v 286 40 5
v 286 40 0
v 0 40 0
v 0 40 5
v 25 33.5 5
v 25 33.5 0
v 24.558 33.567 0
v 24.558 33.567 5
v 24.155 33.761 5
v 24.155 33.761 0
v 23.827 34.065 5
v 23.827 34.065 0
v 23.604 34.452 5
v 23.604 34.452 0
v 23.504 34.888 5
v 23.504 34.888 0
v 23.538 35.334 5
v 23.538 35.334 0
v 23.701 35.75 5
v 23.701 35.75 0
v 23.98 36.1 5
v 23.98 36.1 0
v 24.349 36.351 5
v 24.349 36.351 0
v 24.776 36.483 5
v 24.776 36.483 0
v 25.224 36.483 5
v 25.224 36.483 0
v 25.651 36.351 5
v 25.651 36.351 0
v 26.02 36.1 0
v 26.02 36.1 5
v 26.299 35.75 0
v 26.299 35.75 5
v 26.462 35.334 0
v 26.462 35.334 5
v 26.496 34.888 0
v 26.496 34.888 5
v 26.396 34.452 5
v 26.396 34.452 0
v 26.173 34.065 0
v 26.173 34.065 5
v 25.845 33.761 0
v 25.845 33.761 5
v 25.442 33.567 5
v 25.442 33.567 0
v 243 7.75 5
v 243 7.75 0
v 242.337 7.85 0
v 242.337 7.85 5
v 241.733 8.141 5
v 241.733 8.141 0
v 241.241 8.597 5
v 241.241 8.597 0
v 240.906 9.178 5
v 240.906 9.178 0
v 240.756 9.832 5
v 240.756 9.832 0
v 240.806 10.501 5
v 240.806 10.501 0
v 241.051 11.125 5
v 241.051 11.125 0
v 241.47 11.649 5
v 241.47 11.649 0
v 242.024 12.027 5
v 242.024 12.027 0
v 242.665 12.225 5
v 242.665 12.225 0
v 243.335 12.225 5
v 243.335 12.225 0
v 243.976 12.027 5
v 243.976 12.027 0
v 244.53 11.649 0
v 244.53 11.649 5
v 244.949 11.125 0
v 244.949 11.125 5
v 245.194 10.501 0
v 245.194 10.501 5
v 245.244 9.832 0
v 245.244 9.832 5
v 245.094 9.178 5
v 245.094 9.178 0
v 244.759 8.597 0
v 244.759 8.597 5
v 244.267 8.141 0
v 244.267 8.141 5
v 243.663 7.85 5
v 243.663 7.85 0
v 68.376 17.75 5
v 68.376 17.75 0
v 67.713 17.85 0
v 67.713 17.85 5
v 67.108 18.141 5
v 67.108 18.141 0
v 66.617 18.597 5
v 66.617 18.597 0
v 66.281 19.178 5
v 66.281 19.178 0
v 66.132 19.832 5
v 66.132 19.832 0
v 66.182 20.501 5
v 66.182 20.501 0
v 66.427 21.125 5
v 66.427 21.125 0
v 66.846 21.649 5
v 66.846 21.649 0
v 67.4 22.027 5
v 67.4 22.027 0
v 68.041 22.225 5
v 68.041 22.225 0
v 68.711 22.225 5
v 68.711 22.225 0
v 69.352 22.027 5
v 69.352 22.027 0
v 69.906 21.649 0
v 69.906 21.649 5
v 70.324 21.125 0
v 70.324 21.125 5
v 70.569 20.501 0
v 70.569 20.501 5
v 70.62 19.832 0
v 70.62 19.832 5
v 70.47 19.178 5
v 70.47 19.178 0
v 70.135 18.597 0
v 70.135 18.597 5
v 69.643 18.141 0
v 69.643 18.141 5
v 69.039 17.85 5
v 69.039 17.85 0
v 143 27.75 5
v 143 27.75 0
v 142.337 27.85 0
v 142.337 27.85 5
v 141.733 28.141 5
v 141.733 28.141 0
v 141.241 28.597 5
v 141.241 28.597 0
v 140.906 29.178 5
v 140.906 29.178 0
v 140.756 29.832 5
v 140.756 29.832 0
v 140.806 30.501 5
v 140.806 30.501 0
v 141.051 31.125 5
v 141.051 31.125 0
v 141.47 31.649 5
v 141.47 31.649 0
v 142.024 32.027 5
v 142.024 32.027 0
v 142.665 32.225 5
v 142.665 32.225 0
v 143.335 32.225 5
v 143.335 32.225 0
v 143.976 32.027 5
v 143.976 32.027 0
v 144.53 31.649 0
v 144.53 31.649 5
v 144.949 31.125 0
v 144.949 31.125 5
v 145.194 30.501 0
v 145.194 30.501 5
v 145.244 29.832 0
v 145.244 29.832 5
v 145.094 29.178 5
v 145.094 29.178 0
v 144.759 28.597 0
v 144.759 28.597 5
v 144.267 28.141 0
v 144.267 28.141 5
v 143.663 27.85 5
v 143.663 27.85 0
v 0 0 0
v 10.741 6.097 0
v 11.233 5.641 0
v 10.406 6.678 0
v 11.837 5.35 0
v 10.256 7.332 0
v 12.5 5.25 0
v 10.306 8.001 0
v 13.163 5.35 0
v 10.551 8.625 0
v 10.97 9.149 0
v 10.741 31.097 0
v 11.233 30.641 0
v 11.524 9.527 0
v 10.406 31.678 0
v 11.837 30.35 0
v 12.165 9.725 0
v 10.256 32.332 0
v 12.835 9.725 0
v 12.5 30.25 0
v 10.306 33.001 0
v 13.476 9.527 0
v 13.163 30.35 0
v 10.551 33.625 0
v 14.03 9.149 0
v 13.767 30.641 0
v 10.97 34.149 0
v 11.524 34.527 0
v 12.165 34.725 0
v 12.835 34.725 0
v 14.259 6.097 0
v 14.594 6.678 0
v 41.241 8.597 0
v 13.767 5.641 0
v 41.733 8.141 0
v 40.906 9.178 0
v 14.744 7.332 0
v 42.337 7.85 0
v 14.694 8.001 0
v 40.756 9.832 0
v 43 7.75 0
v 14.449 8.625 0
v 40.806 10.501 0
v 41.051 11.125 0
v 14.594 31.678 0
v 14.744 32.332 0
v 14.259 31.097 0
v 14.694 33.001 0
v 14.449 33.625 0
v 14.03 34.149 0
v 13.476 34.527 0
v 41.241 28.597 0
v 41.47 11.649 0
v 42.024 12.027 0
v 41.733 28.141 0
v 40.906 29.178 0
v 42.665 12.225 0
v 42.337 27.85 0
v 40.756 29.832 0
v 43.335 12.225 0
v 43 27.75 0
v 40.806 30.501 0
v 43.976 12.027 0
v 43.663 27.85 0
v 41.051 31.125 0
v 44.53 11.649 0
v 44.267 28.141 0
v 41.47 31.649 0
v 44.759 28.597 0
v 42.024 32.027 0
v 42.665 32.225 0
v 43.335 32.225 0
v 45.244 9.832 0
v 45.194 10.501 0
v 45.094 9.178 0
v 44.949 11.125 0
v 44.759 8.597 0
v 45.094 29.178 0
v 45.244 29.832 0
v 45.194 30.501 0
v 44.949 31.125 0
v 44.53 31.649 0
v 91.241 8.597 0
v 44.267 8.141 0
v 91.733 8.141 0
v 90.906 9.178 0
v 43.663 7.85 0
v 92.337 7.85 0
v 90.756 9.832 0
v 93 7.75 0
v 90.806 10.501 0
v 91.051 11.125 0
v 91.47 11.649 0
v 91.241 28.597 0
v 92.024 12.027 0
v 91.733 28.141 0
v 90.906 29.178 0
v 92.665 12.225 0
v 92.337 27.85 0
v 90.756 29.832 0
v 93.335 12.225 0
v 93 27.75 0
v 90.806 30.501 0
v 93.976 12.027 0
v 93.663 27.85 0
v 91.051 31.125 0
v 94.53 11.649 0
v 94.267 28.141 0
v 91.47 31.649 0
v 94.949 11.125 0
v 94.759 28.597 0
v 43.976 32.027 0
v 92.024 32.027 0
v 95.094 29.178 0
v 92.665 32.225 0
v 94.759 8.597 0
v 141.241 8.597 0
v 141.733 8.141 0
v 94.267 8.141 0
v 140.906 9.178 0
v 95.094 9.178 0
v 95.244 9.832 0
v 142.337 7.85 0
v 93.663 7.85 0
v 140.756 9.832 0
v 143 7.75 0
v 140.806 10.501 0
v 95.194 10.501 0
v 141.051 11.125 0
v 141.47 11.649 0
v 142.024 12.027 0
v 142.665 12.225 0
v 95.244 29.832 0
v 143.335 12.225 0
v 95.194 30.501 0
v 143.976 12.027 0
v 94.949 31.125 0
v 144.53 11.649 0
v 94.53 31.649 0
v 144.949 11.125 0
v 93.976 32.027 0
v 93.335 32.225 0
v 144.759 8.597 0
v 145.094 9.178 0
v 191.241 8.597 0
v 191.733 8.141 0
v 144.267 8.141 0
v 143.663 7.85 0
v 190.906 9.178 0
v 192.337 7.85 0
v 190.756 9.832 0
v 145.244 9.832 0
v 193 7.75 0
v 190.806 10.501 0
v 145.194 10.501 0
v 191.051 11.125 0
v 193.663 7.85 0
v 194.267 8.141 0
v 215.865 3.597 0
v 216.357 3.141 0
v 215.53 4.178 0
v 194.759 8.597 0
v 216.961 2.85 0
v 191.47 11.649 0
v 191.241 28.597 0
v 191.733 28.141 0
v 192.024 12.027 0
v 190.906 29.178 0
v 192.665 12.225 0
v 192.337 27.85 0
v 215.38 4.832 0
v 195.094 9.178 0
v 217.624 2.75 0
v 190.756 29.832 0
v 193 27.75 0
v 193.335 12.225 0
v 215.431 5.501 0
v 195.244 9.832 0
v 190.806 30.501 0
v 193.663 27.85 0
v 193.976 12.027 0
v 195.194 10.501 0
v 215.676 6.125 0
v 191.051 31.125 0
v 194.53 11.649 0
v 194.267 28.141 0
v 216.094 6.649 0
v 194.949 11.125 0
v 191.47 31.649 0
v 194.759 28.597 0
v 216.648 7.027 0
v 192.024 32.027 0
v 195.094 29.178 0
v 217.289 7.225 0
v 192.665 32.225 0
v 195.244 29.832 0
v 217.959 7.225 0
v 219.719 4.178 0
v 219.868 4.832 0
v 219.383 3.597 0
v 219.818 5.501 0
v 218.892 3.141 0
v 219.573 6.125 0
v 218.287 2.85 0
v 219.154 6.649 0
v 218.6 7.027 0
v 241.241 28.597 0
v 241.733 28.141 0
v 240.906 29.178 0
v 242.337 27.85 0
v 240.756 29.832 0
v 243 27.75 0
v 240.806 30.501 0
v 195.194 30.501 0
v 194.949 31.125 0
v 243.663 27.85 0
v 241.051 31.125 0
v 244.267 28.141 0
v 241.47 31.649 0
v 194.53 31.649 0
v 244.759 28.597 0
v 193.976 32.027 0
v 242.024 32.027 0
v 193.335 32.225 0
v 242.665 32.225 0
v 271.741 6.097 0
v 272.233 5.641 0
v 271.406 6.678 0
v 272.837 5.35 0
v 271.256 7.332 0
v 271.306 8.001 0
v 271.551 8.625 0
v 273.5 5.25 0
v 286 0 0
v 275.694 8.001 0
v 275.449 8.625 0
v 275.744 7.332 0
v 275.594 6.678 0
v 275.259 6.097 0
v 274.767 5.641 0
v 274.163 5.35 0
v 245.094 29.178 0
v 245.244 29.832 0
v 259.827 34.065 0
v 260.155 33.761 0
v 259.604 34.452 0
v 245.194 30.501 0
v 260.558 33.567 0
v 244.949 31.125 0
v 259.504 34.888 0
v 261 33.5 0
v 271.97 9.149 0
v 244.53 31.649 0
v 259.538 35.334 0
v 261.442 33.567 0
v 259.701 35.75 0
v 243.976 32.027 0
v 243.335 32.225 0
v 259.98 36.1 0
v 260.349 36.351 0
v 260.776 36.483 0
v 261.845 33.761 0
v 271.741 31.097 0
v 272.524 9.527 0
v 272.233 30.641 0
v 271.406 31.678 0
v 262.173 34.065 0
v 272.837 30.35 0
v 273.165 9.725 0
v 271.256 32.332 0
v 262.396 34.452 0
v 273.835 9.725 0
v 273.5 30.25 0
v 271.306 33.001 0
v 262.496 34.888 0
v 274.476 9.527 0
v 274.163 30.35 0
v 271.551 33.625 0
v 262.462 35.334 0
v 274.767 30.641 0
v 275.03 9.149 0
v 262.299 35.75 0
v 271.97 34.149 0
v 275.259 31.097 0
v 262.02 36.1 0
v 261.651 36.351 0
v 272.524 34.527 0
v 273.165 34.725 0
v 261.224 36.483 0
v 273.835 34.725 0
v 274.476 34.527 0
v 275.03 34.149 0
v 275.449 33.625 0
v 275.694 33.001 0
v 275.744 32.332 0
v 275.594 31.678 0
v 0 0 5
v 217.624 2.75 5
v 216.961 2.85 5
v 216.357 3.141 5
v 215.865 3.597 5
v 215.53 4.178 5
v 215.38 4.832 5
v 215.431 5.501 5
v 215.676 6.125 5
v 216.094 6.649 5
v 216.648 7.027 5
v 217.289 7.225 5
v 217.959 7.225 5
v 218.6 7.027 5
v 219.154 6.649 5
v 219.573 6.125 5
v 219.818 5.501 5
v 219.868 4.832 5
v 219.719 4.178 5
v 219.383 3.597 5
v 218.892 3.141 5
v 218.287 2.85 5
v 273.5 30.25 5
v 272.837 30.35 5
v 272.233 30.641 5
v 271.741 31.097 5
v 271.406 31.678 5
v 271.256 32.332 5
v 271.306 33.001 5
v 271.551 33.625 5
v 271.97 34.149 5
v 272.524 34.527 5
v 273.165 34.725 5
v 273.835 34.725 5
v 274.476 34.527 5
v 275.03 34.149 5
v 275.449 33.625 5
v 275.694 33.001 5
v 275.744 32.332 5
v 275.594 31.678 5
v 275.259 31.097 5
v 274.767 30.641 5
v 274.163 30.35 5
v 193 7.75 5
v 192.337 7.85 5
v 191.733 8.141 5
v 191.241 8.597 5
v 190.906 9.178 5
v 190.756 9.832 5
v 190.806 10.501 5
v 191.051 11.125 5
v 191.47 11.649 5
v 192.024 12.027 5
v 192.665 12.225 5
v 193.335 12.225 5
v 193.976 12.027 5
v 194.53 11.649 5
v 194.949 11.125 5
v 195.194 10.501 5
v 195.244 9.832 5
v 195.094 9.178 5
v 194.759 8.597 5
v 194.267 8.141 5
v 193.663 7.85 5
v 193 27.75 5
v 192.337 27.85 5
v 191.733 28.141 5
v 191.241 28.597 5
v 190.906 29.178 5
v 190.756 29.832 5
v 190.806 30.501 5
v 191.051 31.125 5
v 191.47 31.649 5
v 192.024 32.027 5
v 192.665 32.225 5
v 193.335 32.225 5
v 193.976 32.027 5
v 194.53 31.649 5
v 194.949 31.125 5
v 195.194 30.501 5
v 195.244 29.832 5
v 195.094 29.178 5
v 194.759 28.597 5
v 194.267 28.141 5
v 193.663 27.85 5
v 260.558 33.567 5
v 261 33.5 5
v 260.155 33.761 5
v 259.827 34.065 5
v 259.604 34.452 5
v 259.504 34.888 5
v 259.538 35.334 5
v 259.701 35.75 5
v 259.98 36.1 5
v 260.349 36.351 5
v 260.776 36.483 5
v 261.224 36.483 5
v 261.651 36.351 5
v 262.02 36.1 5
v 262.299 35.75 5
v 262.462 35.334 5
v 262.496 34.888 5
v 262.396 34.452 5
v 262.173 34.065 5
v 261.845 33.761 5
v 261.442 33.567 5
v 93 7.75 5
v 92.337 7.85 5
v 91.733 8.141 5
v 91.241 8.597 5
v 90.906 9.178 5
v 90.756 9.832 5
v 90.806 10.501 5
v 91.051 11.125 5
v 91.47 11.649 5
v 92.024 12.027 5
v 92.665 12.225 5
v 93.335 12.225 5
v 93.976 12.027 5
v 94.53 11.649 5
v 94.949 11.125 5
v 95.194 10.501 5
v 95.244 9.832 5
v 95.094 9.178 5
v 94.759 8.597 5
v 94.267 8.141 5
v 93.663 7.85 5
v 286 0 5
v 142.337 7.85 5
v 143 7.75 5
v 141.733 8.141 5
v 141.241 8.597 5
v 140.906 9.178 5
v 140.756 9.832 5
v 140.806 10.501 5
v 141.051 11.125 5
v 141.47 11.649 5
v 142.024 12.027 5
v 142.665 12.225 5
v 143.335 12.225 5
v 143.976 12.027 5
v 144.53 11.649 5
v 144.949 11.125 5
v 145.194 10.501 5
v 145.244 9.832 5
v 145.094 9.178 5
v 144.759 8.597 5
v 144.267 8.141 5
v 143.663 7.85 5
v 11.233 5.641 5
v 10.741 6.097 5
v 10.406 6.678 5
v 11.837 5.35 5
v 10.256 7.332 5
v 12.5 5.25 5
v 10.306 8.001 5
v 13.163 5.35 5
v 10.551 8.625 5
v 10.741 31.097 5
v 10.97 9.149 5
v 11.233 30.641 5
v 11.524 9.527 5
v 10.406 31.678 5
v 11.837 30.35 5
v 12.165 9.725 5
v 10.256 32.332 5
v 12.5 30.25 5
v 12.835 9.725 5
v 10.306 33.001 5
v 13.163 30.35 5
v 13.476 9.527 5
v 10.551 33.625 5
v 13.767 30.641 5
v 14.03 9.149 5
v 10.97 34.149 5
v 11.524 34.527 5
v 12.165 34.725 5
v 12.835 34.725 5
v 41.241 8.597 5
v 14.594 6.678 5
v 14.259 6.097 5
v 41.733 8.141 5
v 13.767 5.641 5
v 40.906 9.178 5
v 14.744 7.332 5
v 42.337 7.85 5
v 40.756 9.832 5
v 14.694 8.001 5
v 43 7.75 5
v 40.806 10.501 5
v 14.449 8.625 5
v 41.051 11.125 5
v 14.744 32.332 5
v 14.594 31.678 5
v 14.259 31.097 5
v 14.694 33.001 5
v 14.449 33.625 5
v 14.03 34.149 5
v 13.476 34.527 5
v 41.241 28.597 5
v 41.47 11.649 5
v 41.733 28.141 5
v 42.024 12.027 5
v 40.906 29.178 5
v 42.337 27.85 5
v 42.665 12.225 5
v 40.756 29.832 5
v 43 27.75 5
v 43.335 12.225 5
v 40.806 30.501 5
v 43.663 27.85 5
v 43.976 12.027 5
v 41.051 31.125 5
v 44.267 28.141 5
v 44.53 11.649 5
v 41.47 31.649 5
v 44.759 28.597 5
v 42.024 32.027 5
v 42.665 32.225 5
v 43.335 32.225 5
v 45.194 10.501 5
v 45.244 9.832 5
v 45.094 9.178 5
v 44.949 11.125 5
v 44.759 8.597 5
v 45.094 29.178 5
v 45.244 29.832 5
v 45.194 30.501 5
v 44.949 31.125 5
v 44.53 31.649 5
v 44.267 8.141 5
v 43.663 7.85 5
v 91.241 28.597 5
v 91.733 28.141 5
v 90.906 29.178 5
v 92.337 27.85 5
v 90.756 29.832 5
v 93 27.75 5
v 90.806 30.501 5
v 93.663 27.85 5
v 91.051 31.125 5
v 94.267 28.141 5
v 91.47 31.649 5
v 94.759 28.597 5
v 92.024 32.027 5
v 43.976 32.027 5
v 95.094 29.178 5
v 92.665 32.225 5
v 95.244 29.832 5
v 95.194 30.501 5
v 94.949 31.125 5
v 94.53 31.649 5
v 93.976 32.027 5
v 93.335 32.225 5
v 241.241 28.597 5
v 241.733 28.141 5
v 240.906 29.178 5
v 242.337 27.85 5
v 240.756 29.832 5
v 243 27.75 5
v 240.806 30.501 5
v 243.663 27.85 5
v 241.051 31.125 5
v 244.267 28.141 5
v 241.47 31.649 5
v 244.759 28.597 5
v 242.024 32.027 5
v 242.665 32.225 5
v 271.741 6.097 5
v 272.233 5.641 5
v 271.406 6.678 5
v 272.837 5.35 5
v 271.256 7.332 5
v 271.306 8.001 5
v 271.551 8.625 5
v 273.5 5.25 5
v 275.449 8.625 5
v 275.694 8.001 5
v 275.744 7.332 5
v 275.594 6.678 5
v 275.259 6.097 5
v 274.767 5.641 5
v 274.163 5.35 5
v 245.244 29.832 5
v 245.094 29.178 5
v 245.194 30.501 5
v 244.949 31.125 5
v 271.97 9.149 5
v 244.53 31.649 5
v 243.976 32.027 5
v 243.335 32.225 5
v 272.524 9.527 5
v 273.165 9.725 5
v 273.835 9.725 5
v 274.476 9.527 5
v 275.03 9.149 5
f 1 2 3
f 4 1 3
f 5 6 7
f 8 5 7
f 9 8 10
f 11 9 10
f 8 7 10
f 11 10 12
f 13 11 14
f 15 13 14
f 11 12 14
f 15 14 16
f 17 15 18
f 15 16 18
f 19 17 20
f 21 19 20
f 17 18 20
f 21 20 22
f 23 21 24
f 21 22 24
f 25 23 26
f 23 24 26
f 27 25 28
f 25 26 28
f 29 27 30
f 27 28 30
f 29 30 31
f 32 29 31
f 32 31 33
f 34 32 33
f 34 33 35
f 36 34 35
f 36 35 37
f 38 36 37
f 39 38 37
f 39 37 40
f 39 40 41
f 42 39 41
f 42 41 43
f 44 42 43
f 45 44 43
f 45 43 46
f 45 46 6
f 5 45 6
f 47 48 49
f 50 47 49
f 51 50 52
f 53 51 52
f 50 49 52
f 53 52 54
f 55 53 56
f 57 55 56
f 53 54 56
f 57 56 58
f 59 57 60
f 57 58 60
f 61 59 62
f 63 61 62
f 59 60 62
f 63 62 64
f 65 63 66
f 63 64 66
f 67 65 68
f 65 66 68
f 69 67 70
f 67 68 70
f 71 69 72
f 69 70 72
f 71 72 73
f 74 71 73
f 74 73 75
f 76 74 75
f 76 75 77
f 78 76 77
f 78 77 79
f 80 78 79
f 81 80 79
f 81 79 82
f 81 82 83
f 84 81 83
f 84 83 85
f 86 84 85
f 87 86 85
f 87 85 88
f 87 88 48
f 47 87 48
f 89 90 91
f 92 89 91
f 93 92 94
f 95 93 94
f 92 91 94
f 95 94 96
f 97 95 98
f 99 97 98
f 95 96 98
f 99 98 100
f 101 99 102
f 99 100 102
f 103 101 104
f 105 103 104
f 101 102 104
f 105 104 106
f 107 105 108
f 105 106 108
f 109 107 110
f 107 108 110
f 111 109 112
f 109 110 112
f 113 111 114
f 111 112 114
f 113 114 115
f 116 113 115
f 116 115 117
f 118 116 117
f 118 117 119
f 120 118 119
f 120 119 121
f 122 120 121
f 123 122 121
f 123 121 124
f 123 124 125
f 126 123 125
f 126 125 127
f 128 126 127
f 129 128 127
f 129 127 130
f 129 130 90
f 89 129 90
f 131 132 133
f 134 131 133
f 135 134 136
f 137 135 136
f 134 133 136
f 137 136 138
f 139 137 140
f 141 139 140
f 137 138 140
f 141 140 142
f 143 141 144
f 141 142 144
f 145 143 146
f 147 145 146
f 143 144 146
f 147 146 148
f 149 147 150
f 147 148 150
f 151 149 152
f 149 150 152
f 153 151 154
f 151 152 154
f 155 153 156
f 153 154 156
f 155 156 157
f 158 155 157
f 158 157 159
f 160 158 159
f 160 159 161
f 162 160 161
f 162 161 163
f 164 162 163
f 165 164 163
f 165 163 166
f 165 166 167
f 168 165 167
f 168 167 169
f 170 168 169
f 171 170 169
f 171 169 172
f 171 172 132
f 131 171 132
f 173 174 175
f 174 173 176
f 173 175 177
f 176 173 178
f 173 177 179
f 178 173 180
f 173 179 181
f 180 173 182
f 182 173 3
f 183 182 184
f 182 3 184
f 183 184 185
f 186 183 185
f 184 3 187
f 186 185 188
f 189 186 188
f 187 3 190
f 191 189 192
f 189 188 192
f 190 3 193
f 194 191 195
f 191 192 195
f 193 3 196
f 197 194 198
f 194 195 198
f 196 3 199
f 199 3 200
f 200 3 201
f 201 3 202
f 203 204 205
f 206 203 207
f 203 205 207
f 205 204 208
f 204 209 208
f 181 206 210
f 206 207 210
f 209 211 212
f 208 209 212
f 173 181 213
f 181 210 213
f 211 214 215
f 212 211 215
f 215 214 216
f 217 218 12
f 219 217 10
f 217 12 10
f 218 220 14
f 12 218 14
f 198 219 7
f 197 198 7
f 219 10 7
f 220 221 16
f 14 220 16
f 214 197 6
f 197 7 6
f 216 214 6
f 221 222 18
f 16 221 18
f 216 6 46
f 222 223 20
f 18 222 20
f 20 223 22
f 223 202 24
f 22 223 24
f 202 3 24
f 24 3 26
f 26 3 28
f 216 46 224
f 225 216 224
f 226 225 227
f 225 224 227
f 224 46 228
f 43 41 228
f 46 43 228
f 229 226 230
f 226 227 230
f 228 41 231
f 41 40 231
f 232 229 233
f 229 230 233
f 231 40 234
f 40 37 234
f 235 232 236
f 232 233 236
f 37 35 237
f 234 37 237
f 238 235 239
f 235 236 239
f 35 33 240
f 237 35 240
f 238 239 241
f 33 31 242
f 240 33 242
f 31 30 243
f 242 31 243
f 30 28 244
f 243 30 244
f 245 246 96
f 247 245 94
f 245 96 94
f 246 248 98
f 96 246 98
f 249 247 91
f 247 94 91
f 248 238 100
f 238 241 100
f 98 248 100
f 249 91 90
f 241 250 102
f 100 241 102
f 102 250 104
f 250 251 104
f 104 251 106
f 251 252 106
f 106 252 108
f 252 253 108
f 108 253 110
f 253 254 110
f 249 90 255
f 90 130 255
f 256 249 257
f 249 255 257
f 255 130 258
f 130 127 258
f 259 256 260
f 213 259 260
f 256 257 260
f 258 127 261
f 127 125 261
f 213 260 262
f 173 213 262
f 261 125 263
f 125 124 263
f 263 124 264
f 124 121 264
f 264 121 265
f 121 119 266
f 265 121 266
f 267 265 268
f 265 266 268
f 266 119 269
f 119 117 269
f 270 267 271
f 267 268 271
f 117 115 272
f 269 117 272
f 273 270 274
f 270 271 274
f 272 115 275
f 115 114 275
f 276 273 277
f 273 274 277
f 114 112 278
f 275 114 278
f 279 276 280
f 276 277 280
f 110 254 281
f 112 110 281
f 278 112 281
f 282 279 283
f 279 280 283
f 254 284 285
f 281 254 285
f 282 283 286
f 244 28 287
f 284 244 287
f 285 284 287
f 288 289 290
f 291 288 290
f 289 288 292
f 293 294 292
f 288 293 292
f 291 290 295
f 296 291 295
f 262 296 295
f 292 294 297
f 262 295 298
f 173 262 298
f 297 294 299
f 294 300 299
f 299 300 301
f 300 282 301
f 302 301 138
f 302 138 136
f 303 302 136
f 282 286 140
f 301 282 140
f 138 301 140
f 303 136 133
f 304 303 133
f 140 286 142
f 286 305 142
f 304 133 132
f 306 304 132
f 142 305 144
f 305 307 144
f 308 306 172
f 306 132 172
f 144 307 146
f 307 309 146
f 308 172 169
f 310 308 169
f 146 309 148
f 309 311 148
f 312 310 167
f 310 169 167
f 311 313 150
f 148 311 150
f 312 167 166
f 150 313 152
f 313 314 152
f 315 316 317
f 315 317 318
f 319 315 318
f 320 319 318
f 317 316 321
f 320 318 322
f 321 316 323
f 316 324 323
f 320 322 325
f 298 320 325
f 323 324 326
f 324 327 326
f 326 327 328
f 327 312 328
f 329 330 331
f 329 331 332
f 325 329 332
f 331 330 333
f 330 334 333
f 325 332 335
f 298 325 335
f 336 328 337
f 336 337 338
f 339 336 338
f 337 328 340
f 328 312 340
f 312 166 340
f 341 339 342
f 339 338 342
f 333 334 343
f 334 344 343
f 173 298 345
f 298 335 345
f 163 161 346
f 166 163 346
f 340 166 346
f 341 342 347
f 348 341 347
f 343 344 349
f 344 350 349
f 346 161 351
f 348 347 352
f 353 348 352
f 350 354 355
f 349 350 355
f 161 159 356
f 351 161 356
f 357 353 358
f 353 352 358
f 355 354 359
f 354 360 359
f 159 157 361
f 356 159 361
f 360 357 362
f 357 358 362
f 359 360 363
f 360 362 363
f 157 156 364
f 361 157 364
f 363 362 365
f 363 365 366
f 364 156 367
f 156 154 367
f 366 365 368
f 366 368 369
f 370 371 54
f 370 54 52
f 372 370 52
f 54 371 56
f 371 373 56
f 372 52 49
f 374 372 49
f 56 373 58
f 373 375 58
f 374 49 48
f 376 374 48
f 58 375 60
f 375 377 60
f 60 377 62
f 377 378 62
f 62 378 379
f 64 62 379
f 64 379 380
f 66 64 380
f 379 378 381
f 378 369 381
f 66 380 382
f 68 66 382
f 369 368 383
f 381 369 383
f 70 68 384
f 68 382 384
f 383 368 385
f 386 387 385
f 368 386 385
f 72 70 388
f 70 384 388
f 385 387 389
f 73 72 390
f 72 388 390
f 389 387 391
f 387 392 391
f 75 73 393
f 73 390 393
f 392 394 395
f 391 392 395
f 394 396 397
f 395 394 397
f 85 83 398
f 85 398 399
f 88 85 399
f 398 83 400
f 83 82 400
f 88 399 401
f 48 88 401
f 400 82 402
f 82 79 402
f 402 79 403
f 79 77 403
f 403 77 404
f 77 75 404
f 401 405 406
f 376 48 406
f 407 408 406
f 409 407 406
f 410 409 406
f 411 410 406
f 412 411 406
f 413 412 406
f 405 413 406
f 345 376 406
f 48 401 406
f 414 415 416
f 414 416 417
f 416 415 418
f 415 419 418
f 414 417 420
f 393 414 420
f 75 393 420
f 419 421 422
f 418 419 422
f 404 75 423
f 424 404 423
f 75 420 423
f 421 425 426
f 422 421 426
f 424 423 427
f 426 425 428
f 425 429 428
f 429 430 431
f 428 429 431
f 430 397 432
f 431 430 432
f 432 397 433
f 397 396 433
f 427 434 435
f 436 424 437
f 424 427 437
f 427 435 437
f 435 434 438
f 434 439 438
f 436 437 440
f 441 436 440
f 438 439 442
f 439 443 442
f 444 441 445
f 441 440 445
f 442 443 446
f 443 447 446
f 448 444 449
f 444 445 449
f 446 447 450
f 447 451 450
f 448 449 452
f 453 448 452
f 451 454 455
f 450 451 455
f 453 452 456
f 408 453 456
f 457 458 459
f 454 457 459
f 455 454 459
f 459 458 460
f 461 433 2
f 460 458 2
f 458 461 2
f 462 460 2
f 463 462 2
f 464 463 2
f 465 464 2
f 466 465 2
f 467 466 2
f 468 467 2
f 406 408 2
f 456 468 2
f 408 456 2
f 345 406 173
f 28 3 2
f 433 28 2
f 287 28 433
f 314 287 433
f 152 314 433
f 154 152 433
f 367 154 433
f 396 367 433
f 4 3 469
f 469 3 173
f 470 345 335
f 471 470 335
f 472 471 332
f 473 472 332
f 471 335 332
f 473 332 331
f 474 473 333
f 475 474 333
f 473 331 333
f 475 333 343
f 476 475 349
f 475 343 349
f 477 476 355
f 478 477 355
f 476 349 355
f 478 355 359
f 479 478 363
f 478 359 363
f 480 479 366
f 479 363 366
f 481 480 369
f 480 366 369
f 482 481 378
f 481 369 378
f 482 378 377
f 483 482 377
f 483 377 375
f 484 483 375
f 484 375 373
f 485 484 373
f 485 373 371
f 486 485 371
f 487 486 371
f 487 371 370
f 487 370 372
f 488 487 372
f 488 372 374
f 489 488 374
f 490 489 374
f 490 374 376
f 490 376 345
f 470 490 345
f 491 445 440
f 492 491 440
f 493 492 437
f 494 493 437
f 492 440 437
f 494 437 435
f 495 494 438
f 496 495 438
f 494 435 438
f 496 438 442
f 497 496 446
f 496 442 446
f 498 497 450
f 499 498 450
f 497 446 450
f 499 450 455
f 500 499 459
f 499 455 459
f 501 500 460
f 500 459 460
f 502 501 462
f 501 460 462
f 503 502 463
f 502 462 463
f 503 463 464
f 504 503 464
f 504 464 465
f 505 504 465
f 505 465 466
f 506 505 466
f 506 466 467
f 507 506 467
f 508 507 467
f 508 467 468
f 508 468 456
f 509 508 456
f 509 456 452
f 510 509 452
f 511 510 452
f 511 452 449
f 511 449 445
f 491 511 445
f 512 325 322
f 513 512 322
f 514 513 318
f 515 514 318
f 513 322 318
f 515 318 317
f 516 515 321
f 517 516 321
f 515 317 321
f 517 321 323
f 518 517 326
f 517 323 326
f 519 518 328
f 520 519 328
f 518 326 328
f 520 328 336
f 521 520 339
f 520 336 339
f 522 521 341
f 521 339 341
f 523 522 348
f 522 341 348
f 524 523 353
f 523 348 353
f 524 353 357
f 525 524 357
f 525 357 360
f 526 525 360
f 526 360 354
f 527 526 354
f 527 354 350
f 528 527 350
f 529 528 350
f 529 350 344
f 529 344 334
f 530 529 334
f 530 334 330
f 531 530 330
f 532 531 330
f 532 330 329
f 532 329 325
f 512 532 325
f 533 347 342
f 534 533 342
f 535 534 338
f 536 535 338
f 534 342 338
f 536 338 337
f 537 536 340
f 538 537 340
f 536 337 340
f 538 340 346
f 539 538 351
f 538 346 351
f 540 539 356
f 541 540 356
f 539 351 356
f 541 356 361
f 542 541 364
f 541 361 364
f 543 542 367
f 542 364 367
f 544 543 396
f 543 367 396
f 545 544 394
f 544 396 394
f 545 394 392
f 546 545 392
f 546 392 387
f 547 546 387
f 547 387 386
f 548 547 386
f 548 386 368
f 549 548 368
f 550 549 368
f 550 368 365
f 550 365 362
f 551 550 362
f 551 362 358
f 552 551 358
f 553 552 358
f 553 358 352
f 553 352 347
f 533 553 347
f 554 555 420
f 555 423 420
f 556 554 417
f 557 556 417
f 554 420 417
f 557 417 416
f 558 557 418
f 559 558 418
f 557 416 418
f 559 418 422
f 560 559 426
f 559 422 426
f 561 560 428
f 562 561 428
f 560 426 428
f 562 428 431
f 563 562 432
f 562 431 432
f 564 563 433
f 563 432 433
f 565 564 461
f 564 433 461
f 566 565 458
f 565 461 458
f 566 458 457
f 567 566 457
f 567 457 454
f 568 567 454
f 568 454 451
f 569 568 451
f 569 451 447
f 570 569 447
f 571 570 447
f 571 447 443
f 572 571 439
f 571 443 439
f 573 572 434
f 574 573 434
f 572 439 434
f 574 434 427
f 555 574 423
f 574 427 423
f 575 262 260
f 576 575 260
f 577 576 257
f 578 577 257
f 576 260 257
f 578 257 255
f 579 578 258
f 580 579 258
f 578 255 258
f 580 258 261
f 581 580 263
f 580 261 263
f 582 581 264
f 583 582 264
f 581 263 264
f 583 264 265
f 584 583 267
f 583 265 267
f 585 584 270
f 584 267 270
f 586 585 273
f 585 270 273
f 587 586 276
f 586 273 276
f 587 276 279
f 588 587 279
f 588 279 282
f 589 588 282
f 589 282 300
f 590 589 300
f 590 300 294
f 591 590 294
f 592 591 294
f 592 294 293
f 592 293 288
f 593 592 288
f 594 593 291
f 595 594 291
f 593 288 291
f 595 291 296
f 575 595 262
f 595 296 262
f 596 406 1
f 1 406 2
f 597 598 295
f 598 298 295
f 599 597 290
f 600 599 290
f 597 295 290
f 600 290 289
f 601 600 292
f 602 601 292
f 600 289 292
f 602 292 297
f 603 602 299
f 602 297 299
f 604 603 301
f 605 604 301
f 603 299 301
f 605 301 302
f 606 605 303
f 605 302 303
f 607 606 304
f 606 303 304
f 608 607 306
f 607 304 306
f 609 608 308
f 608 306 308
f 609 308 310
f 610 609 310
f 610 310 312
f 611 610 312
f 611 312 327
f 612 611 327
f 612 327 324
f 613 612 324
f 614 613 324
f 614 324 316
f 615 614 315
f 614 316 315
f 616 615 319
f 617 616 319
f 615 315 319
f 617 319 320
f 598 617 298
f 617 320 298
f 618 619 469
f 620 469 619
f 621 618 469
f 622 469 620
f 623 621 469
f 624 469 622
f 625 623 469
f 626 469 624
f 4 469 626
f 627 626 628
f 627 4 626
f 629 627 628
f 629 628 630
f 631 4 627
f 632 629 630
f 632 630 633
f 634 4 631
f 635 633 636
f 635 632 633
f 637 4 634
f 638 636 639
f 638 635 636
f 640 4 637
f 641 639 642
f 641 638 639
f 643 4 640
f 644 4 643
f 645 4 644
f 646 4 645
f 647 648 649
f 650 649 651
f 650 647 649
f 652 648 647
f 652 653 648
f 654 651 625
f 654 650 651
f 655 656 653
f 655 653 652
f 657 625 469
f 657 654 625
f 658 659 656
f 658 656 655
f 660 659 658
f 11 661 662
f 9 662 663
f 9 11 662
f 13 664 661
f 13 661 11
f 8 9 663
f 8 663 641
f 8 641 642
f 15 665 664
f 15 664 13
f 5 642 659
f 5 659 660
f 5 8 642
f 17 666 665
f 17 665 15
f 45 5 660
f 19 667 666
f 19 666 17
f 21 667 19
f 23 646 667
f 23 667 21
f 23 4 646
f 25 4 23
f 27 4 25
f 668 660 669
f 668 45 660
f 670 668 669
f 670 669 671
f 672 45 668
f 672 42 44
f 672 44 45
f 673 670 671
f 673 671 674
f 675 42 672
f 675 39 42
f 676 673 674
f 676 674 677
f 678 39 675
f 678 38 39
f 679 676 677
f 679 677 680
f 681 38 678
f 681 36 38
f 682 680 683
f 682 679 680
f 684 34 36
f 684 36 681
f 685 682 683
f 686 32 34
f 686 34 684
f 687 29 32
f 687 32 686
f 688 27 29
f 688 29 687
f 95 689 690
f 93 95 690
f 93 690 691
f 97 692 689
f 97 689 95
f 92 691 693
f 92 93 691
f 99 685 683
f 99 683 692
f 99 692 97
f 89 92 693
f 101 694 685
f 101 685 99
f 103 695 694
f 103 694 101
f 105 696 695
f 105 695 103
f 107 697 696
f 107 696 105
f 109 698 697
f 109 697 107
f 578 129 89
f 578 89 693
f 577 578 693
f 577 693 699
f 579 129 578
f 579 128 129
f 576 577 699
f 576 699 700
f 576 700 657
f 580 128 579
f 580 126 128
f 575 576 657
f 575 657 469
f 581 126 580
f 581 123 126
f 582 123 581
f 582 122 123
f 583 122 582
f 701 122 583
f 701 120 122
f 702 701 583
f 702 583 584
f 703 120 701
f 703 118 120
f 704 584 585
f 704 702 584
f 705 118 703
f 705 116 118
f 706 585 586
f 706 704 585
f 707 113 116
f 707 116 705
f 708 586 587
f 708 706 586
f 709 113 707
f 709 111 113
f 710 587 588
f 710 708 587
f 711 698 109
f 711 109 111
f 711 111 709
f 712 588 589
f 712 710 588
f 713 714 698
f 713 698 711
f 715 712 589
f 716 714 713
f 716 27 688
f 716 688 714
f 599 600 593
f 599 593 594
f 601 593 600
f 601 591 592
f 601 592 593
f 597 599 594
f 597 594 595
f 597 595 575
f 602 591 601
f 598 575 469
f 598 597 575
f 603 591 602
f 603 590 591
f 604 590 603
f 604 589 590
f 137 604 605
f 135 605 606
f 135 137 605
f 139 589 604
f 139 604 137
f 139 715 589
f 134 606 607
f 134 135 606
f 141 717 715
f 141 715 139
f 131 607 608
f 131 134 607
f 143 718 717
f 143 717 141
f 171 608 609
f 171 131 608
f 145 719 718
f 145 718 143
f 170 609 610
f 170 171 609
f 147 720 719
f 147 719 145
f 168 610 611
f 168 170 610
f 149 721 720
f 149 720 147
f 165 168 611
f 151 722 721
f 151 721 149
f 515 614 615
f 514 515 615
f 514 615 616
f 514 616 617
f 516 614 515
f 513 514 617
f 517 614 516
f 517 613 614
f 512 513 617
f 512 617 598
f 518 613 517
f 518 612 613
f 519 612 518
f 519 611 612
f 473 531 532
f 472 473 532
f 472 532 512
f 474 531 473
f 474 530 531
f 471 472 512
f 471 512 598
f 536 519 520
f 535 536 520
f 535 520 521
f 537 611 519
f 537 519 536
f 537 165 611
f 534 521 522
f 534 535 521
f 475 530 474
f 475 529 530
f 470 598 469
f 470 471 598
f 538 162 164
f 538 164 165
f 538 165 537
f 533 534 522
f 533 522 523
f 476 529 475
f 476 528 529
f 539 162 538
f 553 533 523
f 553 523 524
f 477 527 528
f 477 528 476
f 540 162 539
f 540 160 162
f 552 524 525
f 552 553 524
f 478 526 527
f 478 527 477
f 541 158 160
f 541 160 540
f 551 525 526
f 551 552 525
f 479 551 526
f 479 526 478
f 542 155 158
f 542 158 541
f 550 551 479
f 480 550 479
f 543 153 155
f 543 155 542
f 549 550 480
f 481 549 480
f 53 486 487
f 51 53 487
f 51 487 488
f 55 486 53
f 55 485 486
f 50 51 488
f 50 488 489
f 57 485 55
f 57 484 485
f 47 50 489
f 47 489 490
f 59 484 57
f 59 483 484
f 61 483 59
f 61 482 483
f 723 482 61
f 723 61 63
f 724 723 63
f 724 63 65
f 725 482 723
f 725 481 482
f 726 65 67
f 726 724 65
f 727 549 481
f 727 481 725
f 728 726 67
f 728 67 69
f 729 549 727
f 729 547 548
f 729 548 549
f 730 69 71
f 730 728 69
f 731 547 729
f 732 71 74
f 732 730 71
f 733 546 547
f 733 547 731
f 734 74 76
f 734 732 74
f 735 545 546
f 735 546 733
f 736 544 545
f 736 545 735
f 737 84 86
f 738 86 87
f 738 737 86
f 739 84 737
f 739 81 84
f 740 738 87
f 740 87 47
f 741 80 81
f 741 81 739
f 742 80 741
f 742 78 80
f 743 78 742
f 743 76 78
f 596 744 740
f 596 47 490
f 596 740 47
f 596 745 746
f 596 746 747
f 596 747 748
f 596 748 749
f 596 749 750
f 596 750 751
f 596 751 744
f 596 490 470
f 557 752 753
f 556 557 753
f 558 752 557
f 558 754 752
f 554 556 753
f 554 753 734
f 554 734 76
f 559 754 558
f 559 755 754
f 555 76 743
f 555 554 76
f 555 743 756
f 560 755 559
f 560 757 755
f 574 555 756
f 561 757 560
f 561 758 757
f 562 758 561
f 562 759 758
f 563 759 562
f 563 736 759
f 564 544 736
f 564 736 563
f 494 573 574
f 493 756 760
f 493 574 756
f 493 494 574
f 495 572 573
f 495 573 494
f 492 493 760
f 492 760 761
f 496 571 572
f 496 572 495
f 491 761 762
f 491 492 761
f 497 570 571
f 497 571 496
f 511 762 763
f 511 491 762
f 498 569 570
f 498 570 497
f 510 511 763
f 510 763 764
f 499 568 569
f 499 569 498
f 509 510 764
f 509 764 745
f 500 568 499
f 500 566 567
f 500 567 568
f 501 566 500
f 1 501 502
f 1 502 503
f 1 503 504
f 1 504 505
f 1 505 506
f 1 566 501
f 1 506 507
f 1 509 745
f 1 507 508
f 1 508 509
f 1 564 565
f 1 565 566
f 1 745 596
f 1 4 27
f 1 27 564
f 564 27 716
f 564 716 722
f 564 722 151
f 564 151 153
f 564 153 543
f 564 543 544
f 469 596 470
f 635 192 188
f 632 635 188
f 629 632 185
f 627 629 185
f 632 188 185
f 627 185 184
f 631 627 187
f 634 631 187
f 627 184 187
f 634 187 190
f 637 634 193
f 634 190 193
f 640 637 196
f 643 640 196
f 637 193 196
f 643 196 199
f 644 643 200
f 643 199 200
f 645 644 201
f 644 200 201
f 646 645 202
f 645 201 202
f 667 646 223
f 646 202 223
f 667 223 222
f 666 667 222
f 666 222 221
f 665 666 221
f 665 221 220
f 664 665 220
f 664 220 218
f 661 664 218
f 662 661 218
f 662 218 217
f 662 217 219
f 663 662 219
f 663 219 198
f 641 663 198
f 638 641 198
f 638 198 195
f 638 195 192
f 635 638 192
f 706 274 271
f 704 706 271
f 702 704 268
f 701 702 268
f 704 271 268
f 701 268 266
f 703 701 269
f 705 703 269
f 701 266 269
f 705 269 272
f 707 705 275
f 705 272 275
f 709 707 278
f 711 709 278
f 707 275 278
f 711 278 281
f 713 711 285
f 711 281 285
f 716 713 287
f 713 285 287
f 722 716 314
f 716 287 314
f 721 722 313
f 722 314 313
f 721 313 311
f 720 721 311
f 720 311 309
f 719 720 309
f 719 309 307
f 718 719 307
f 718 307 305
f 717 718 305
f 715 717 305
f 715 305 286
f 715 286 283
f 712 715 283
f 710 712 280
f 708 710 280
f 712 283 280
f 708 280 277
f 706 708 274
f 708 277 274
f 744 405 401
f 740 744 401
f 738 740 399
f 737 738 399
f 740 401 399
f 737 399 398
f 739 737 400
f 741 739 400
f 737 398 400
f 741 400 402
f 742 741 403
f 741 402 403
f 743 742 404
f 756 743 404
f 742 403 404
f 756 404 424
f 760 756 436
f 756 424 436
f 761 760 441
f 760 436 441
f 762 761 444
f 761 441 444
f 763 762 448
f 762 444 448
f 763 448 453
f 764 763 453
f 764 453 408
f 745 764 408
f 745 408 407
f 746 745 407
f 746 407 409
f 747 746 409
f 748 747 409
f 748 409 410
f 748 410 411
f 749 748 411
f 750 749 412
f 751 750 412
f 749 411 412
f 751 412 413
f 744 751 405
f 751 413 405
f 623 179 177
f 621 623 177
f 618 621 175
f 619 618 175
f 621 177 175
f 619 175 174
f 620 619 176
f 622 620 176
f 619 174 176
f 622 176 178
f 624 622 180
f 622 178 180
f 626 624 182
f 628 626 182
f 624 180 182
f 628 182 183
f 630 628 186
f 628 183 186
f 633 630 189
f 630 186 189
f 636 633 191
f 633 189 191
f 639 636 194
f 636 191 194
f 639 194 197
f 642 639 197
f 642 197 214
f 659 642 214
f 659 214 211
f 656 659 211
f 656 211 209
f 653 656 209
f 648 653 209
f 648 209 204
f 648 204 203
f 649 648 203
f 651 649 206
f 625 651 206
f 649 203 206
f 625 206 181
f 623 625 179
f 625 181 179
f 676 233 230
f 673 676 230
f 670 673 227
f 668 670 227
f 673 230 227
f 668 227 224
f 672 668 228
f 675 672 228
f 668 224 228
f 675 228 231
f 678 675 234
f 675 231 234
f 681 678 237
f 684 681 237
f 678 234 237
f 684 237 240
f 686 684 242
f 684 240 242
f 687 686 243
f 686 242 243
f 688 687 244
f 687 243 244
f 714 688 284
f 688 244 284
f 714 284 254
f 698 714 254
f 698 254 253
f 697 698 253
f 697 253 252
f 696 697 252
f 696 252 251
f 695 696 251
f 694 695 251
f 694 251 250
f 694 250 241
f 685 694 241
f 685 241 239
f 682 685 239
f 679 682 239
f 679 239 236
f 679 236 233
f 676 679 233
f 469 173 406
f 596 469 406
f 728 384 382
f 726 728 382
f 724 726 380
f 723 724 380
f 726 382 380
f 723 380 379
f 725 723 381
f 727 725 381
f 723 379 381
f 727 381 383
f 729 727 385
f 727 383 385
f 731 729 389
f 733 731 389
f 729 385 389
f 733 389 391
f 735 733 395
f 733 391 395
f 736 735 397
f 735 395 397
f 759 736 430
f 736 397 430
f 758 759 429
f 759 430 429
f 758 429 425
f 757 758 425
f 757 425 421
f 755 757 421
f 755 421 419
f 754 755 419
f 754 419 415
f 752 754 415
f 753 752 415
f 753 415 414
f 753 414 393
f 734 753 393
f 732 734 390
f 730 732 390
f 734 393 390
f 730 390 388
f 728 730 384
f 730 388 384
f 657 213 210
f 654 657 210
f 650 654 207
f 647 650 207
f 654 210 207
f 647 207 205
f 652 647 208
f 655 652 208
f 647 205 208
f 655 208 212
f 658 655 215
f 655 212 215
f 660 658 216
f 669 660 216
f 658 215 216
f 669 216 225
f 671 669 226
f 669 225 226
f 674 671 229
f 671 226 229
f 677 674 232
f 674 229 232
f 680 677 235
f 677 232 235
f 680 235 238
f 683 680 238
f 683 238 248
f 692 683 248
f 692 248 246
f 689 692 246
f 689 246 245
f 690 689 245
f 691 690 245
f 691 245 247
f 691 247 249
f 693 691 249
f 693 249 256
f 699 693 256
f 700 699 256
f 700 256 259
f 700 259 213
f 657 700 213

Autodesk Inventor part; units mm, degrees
ref_plane "YZ Plane" through (0, 0, 0) normal (1, 0, 0) x (0, 1, 0)
ref_plane "XZ Plane" through (0, 0, 0) normal (0, 1, 0) x (-1, 0, 0)
ref_plane "XY Plane" through (0, 0, 0) normal (0, 0, 1) x (1, 0, 0)
sketch "Sketch1" plane through (0, 0, 0) normal (0, 0, 1) x (1, 0, 0)
  line L0 (0, 0) -> (286, 0)
  line L1 (286, 0) -> (286, 40)
  line L2 (286, 40) -> (0, 40)
  line L3 (0, 40) -> (0, 0)
  dimension "d0" = 286
  dimension "d1" = 40
extrude "Extrusion1" add sketch "Sketch1" along normal blind 5
sketch "Sketch2" plane through (0, 0, 5) normal (0, 0, 1) x (1, 0, 0)
  line L0 (286, 40) -> (0, 40) projected
  line L1 (0, 0) -> (286, 0) projected
  line L2 (0, 40) -> (0, 0) projected
  point P0 (43, 30)
  point P1 (43, 10)
  dimension "d4" = 10
  dimension "d6" = 43
  dimension "d40" = 20
  dimension "d41" = 10
hole "Hole1" at (43, 30, 5) at (43, 10, 5) direction (0, 0, -1) diameter 4.5 end through all clearance for "Flat Head Machine Screw" size "M4" standard "Ansi Metric M Profile"
pattern_linear "Rectangular Pattern1" count 5 spacing 50 along (1, 0, 0) of "Hole1"
sketch "Sketch3" plane through (0, 0, 5) normal (0, 0, 1) x (1, 0, 0)
  line L0 (286, 40) -> (0, 40) projected
  line L1 (0, 40) -> (0, 0) projected
  line L2 (286, 0) -> (286, 40) projected
  point P0 (68.3759, 20)
  point P1 (217.6241, 5)
  dimension "d17" = 150
  dimension "d18" = 20
  dimension "d19" = 15
  dimension "d20" = 68.3759
  dimension "d21" = 68.3759
hole "Hole2" at (68.3759, 20, 5) at (217.6241, 5, 5) direction (0, 0, -1) diameter 4.5 end through all clearance for "Flat Head Machine Screw" size "M4" standard "Ansi Metric M Profile"
sketch "Sketch4" plane through (0, 0, 5) normal (0, 0, 1) x (1, 0, 0)
  line L0 (286, 40) -> (0, 40) projected
  line L1 (0, 0) -> (286, 0) projected
  line L2 (0, 40) -> (0, 0) projected
  line L3 (286, 0) -> (286, 40) projected
  point P0 (12.5, 32.5)
  point P1 (12.5, 7.5)
  point P2 (273.5, 32.5)
  point P3 (273.5, 7.5)
  dimension "d29" = 7.5
  dimension "d30" = 7.5
  dimension "d31" = 12.5
  dimension "d32" = 12.5
hole "Hole3" at (12.5, 32.5, 5) at (12.5, 7.5, 5) at (273.5, 32.5, 5) at (273.5, 7.5, 5) direction (0, 0, -1) diameter 4.5 end through all clearance for "Flat Head Machine Screw" size "M4" standard "Ansi Metric M Profile"
sketch "Sketch5" plane through (0, 0, 5) normal (0, 0, 1) x (1, 0, 0)
  line L0 (286, 40) -> (0, 40) projected
  line L1 (0, 40) -> (0, 0) projected
  line L2 (286, 0) -> (286, 40) projected
  point P0 (25, 35)
  point P1 (261, 35)
  dimension "d42" = 5
  dimension "d43" = 25
  dimension "d44" = 25
hole "Hole4" at (25, 35, 5) at (261, 35, 5) direction (0, 0, -1) diameter 3 end through all
equation "\"d20\" = d21"
equation "\"d30\" = d29"
equation "\"d32\" = d31"
equation "\"d44\" = d43"
properties part number "Top_Slider Piece 1" material "Wood (Oak)"
